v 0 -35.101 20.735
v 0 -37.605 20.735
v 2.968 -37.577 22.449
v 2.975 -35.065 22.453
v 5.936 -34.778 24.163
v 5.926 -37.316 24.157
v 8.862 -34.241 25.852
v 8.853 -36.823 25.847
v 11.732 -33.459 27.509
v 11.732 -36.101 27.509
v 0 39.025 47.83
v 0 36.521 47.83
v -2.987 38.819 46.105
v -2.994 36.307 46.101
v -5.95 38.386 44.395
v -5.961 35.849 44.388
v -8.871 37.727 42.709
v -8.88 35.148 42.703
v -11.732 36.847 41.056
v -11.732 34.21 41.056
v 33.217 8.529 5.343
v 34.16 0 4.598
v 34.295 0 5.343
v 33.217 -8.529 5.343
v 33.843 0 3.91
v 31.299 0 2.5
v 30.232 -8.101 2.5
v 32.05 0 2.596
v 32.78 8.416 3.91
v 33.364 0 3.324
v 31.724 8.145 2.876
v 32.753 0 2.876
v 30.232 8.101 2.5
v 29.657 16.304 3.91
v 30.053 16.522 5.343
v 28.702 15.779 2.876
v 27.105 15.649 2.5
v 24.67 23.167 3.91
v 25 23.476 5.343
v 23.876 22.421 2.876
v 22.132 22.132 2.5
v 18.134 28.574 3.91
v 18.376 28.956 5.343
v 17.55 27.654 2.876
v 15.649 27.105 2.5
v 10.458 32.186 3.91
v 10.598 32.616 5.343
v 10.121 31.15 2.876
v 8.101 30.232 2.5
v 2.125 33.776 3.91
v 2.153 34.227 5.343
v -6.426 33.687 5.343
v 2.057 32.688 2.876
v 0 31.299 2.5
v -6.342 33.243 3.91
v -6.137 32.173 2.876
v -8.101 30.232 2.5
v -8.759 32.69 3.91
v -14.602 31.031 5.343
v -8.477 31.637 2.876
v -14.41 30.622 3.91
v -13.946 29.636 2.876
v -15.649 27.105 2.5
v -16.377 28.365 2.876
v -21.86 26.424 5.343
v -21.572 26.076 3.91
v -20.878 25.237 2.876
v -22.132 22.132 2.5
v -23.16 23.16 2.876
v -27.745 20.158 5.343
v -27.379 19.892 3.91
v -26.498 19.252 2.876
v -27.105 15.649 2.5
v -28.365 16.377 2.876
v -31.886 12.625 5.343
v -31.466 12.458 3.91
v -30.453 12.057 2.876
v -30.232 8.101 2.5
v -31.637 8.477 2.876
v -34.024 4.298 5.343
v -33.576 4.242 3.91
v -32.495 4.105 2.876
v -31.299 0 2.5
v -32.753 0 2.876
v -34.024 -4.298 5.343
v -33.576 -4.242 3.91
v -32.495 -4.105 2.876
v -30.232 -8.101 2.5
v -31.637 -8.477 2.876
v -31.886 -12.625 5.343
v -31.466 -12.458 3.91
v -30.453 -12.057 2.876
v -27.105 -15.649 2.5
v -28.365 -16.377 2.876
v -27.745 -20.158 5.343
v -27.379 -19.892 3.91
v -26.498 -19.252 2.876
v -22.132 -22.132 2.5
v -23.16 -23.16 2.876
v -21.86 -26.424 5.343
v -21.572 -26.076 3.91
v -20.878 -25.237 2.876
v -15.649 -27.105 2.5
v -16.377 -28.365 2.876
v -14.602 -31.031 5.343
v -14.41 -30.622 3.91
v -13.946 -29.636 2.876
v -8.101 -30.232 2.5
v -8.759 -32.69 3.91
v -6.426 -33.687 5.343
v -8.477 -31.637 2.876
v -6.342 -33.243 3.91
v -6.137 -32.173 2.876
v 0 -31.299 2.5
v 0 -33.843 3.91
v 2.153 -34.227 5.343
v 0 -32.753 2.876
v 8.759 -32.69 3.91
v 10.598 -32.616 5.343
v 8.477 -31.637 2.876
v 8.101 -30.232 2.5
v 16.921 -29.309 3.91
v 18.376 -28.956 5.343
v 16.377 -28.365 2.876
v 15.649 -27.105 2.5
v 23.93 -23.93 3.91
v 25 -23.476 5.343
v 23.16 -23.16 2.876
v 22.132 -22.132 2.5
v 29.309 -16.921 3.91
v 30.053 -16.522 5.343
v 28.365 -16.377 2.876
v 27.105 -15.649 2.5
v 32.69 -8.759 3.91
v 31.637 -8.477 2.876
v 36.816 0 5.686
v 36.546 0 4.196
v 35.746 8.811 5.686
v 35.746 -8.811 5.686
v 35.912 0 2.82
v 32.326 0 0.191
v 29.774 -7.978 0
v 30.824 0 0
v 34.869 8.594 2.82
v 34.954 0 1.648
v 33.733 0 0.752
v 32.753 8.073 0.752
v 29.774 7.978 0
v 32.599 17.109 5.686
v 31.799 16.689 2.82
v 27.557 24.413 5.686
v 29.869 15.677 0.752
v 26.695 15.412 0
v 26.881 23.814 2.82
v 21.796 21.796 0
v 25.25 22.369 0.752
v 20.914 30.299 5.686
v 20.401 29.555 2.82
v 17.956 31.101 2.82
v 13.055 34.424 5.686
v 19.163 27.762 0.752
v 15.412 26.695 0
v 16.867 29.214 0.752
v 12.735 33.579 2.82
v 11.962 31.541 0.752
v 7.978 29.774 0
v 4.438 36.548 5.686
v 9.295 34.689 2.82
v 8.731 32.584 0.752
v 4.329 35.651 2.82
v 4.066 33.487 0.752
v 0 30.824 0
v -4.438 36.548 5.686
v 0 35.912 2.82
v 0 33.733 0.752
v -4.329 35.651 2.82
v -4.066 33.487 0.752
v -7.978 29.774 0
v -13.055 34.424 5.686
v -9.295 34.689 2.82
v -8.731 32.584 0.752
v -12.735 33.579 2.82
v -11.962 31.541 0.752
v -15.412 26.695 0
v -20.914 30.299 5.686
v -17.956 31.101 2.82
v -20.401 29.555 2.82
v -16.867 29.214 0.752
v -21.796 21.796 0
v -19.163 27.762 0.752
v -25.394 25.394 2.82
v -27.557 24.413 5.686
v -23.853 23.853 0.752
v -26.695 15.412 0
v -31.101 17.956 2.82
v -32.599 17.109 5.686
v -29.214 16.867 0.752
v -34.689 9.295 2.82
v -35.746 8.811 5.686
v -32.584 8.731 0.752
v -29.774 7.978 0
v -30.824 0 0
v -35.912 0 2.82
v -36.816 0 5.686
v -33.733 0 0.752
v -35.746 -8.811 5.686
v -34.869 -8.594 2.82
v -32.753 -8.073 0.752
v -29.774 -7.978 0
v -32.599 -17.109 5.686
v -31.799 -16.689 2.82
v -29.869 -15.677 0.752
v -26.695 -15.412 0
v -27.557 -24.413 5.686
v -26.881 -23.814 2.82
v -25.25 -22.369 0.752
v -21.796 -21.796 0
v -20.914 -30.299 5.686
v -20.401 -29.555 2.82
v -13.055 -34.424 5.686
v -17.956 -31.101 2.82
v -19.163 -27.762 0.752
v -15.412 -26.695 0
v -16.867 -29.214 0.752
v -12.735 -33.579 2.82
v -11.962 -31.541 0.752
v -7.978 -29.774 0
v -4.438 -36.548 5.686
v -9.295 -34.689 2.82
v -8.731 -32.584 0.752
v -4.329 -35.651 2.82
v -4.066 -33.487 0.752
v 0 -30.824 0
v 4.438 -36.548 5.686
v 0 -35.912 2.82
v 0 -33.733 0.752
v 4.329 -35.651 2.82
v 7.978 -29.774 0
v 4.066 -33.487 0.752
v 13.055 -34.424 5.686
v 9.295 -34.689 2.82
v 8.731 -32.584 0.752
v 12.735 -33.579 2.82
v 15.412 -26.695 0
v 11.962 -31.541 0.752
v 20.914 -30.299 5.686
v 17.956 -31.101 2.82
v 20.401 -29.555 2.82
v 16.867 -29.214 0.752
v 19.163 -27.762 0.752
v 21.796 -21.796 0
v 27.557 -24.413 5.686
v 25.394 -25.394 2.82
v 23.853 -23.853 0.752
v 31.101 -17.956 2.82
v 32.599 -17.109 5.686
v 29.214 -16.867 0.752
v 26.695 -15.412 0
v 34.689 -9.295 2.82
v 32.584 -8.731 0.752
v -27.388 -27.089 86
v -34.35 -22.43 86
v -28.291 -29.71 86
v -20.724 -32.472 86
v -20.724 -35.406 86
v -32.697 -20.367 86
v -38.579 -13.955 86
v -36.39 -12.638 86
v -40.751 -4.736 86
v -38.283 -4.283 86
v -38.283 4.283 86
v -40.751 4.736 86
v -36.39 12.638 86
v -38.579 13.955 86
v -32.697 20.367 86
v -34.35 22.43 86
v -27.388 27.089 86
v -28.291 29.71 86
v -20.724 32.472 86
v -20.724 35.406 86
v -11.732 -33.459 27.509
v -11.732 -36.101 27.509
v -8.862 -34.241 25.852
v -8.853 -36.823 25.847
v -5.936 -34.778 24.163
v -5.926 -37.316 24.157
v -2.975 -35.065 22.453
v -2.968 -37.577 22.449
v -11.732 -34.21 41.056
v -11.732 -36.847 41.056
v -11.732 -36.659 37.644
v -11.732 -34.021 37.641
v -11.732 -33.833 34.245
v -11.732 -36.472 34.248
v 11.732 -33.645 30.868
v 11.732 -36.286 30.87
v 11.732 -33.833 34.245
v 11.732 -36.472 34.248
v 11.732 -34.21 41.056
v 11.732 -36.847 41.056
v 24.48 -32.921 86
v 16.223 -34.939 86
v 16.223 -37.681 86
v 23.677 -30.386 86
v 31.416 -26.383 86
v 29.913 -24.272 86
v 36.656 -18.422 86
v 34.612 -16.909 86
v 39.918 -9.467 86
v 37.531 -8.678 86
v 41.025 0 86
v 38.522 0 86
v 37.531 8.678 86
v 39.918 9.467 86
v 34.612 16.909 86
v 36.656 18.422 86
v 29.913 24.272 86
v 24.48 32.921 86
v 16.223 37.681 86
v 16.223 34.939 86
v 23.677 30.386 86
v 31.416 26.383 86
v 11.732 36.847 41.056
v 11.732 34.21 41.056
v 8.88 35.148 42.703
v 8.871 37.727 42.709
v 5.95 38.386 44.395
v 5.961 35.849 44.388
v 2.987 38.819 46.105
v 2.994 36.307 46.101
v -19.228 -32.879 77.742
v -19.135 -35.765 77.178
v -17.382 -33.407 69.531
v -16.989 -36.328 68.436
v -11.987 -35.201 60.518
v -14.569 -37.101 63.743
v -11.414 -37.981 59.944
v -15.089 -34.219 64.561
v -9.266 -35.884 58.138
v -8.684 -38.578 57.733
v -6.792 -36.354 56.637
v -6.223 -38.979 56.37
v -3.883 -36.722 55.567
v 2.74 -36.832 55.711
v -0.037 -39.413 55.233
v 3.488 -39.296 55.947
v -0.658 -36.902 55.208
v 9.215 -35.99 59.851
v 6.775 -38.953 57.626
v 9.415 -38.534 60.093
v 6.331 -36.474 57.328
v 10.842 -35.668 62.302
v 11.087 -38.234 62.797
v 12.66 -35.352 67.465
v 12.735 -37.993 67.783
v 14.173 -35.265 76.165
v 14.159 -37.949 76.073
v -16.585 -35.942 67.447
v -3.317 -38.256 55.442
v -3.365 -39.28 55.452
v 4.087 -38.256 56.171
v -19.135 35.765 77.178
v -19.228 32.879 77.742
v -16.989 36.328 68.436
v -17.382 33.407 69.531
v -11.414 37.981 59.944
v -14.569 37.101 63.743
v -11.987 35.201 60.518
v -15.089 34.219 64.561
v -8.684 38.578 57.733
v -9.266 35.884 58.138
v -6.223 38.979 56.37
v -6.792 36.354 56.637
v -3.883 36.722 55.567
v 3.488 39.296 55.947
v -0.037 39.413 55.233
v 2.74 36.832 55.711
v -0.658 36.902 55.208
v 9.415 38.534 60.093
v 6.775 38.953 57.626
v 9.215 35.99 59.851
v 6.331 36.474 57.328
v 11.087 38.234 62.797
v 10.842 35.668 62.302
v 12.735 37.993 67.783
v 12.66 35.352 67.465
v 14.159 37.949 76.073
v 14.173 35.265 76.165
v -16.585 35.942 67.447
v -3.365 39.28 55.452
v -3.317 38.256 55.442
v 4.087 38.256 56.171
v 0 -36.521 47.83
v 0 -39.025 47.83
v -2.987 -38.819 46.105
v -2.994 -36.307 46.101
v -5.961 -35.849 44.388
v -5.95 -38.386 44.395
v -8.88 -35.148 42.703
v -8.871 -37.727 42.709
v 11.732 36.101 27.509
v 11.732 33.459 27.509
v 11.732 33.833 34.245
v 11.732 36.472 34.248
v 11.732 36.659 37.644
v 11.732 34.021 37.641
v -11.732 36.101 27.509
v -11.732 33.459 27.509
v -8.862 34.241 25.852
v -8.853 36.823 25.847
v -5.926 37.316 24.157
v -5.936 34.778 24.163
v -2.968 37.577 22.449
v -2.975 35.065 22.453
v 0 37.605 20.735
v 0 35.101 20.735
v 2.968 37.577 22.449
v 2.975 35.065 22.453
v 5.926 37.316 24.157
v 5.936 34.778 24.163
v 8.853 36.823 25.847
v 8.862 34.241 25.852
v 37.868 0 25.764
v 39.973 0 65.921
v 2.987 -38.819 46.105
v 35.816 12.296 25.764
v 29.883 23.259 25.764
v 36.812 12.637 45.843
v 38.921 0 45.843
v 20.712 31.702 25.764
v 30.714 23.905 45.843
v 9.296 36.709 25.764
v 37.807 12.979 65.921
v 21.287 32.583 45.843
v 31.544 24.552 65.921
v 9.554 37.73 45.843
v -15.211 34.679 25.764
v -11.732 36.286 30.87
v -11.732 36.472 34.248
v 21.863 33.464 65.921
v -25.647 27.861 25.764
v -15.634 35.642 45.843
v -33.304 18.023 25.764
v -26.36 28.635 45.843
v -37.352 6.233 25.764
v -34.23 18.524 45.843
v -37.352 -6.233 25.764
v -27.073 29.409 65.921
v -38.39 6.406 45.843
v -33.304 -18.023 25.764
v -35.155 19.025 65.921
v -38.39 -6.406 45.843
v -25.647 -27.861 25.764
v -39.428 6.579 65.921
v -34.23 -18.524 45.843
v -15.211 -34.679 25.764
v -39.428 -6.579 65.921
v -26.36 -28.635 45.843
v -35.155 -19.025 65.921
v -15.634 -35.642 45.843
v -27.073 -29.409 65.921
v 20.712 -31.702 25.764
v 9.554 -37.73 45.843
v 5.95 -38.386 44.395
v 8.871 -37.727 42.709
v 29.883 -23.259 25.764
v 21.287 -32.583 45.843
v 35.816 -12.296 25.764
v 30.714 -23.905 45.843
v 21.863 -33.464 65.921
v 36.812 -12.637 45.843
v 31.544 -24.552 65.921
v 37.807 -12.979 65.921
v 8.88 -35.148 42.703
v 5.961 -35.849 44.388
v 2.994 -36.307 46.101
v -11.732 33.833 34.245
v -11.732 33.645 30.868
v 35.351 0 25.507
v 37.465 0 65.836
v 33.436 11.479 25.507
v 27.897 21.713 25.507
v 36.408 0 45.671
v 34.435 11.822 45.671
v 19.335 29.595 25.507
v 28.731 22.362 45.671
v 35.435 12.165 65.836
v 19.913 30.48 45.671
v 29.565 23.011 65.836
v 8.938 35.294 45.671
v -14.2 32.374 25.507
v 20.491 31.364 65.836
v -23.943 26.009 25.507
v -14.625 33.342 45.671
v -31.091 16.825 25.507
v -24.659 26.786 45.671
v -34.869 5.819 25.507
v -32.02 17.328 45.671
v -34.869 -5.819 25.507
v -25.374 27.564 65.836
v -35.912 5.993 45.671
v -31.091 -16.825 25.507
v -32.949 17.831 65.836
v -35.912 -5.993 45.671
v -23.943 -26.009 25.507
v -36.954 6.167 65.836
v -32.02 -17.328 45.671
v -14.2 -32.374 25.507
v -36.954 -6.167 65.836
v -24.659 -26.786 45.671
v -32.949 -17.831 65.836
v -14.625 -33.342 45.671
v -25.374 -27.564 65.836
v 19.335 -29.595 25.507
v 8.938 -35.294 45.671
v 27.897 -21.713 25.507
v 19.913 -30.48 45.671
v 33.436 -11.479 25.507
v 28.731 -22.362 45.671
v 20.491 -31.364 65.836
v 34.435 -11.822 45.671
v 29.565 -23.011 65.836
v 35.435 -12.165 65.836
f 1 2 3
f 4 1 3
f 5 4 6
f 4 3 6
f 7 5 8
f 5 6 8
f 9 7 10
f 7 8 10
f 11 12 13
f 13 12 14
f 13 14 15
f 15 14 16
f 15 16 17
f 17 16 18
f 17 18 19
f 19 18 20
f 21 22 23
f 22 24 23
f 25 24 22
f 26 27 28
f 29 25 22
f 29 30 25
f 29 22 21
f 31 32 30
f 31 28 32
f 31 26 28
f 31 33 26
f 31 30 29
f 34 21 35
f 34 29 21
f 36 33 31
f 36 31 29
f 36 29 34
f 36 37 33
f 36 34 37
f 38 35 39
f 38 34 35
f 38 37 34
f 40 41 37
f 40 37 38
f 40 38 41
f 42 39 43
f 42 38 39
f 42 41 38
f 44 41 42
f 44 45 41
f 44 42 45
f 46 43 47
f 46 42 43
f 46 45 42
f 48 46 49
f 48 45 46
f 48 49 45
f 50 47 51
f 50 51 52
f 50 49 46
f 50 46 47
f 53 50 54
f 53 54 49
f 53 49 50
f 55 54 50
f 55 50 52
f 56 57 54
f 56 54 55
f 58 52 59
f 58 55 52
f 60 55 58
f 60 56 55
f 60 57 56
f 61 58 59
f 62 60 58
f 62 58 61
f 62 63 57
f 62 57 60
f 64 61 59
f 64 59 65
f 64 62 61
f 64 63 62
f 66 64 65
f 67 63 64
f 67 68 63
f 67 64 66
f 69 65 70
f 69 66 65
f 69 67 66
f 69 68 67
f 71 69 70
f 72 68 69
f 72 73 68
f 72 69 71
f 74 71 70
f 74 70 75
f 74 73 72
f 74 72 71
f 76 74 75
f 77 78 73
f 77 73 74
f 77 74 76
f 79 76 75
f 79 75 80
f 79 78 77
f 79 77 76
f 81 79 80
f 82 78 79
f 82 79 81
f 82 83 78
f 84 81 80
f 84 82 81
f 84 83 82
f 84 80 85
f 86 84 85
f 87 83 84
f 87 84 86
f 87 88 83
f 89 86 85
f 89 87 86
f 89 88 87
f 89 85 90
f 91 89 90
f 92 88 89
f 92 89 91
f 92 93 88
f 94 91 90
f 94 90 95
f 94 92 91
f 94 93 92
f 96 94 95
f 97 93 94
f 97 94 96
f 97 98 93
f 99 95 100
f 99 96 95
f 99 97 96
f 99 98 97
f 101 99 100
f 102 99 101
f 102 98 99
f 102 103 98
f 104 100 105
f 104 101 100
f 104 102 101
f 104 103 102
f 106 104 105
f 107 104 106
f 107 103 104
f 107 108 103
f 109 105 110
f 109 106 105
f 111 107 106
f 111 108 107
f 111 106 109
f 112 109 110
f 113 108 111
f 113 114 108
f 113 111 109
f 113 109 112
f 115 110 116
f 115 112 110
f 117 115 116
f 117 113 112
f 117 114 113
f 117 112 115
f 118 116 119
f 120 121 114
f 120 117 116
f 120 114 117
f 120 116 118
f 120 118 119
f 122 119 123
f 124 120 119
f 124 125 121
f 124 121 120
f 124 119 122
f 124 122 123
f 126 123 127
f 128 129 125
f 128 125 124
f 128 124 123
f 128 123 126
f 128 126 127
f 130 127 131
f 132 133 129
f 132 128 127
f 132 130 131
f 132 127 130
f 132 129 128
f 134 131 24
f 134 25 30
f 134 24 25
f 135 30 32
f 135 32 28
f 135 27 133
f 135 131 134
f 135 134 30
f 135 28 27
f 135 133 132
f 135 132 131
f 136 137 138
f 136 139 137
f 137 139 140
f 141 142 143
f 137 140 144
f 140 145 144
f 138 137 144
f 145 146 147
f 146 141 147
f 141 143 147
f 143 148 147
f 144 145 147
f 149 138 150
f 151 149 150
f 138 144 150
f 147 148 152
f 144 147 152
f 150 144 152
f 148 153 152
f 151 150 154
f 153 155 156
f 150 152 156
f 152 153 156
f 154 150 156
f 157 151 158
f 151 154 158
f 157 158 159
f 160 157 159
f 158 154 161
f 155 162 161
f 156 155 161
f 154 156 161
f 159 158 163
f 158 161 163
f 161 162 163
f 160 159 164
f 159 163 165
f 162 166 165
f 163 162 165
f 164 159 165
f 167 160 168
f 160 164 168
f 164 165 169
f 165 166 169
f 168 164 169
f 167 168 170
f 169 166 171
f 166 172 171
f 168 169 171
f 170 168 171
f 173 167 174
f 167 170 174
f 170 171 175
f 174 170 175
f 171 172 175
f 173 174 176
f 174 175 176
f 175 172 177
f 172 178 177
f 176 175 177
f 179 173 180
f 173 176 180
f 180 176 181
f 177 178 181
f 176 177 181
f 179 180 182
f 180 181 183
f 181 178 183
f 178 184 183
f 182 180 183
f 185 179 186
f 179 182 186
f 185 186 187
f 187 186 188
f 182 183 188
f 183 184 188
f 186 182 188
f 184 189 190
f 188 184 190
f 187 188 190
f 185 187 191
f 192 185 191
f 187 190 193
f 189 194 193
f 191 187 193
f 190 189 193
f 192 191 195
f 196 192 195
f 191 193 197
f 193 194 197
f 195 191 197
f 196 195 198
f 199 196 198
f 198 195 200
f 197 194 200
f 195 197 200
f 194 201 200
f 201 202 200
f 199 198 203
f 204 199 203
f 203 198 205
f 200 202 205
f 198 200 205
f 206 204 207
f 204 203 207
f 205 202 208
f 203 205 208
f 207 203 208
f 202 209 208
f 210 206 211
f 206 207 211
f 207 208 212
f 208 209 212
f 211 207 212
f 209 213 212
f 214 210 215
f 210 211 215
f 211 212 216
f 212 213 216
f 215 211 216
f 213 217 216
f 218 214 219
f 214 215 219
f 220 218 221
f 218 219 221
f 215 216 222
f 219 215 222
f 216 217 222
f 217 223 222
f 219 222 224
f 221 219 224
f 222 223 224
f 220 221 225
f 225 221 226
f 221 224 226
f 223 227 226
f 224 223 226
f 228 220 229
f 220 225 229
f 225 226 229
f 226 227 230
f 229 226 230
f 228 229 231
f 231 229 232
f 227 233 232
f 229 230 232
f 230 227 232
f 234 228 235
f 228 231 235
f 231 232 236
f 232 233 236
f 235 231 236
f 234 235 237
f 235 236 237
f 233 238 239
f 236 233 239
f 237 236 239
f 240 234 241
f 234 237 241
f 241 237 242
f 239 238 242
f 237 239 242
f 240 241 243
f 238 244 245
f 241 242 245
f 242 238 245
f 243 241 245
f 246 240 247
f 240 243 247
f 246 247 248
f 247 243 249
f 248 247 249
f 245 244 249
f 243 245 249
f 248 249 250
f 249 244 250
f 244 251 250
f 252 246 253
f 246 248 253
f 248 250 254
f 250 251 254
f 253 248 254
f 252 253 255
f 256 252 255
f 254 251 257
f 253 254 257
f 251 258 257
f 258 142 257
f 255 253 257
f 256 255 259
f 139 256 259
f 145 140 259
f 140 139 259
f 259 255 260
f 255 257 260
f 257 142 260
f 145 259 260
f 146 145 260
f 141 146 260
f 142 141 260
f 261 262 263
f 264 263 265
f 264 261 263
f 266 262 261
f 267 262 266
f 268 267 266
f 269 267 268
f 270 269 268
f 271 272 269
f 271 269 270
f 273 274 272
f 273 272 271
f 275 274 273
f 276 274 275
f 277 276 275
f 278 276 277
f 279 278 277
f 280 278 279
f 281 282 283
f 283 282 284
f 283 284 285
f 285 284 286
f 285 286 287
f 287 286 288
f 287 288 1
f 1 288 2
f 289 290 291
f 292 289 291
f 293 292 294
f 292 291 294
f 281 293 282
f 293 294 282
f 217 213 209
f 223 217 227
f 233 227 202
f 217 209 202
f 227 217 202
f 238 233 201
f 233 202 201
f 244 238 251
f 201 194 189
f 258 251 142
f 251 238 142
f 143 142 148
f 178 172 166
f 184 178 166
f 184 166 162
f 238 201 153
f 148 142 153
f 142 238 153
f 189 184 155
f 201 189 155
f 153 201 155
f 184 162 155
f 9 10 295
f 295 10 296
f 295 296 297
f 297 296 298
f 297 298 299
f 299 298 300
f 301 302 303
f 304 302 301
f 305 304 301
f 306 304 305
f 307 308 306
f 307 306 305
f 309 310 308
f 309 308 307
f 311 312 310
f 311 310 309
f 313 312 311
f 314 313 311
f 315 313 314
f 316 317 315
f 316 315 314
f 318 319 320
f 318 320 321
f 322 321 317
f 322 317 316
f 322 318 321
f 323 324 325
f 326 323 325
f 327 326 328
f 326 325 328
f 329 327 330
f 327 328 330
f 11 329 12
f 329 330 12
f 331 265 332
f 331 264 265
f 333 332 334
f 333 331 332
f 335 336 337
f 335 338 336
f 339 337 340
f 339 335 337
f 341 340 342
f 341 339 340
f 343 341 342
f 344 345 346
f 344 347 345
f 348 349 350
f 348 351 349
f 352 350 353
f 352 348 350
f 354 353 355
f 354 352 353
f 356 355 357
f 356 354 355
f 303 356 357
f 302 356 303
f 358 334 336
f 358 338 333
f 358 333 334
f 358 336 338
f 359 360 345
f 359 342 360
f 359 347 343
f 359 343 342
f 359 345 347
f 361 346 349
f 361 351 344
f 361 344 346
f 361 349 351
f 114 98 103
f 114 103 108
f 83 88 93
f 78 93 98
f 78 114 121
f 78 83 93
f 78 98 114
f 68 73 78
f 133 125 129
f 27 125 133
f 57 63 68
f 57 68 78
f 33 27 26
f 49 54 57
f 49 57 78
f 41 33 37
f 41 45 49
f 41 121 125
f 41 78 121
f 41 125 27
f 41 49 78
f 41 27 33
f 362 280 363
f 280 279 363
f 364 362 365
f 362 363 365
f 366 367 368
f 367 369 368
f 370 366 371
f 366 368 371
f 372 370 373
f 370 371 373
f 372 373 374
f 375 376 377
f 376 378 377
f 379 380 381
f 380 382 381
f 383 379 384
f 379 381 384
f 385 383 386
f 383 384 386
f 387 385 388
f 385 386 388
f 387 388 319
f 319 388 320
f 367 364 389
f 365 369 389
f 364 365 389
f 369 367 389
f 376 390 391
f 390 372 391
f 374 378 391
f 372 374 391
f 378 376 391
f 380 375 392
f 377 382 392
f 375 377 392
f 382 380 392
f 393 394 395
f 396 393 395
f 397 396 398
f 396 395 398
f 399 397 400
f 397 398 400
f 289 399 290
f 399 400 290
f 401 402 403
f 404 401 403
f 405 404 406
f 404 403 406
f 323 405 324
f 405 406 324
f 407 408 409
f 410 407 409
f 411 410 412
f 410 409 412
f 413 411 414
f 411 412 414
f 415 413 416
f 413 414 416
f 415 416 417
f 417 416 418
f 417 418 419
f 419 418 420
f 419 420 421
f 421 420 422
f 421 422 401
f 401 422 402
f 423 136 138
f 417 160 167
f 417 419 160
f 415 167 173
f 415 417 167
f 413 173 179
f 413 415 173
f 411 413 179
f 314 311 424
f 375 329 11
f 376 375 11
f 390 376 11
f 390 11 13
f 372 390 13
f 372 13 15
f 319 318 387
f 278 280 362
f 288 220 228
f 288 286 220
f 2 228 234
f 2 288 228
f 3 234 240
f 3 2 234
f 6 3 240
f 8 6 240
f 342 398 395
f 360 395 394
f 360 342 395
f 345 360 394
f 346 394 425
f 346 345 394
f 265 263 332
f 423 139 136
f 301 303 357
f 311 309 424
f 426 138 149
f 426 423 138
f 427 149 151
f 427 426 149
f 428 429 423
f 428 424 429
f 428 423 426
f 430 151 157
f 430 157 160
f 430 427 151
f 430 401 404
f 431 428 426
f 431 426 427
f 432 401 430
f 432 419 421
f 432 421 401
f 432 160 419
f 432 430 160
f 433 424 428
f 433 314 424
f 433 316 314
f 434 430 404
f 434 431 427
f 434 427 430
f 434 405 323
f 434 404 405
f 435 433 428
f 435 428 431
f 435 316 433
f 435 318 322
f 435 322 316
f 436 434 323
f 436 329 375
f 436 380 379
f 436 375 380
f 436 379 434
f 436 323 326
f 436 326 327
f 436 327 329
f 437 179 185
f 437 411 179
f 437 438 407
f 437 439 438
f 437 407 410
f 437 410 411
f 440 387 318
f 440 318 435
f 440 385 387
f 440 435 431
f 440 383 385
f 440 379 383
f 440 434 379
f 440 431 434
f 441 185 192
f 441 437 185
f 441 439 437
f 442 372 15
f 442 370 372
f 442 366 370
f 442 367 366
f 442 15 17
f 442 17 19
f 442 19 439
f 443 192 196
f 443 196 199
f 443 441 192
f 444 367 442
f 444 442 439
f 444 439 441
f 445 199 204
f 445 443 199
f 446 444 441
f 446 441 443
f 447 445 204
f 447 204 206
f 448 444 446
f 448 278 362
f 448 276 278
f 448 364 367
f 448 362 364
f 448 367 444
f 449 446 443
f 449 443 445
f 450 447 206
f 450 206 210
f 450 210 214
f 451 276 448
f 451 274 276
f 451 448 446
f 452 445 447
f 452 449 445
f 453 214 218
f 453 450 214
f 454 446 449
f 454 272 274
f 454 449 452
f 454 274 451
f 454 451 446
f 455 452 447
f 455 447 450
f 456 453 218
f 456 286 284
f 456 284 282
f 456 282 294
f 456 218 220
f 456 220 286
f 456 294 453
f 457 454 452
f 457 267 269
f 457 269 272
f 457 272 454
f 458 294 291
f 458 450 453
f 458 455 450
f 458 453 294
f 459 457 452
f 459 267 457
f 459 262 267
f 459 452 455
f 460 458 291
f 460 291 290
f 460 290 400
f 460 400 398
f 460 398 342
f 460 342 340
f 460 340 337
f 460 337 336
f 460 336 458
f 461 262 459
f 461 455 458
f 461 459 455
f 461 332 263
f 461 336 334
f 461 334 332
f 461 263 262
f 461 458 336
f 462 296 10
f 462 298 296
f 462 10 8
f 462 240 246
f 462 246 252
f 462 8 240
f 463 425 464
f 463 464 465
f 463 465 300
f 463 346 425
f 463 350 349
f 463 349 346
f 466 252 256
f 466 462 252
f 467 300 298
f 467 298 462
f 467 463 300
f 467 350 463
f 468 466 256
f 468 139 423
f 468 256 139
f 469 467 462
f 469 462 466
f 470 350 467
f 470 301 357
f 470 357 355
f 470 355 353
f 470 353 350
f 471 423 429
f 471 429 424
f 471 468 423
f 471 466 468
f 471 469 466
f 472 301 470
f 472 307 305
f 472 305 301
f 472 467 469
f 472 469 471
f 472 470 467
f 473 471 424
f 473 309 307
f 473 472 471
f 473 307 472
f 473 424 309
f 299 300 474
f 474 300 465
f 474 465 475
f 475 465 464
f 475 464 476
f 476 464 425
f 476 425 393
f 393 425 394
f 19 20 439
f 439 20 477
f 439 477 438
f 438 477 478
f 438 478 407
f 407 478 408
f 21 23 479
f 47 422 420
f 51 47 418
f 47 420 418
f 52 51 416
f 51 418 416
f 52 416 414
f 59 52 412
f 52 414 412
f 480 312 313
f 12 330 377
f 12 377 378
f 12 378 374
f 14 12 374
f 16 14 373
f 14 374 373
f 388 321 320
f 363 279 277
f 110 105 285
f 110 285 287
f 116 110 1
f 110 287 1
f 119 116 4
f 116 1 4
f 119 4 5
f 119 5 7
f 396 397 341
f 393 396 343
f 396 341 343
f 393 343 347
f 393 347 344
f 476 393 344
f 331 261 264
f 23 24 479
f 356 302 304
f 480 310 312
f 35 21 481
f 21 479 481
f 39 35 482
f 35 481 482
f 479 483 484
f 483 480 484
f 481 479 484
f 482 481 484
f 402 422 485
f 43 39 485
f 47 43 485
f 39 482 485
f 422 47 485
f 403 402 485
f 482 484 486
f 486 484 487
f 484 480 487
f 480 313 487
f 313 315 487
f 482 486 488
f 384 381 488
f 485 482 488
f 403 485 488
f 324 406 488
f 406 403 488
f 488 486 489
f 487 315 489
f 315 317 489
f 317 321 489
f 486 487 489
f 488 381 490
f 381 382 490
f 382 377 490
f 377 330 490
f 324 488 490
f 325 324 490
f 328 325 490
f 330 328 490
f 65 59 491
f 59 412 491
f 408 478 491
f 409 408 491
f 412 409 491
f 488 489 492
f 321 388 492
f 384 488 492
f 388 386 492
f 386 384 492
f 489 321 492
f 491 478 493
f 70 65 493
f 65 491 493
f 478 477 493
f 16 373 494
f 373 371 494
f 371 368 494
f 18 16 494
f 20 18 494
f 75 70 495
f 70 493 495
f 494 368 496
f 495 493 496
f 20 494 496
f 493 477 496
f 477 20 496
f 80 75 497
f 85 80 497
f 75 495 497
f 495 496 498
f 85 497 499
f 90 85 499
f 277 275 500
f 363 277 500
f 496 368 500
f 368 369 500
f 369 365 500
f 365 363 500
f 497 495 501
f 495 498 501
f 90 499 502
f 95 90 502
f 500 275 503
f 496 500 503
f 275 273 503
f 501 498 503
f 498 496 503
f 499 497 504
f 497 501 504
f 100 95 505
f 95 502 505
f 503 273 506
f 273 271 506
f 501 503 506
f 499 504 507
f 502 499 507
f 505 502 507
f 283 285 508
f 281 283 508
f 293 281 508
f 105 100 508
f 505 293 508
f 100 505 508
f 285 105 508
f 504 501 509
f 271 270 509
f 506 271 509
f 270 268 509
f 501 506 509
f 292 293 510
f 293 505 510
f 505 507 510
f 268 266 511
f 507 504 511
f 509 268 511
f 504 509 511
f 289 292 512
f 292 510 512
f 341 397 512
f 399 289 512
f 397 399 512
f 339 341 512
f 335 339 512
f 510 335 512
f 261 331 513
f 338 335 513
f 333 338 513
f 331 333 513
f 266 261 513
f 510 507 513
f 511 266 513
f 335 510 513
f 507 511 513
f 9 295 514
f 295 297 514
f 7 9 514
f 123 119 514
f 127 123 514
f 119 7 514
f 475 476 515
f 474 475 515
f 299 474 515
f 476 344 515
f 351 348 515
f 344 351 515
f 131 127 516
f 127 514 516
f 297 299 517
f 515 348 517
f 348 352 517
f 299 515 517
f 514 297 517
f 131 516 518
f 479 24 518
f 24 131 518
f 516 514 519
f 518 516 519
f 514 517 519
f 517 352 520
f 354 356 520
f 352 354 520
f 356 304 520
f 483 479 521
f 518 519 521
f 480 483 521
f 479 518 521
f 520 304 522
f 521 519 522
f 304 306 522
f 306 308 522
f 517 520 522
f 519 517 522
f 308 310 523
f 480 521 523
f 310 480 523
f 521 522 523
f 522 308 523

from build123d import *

# Parameters (mm, degrees)
F0_R     = 36.5179741317
F1_DEPTH = 86
F1_TAPER = -3
F2_T     = -2.5
F4_DEPTH = 67.6
F6_DEPTH = 101
F7_R     = 3
F8_R     = 6


with BuildPart() as f1:
    # F0 (on Top) → F1 (new body)
    with BuildSketch(Plane.XY):
        Circle(F0_R)
    extrude(amount=F1_DEPTH, taper=F1_TAPER)

    # F2
    f2_openings = [f1.faces().sort_by_distance(p)[0] for p in [
        (0, 0, 86),
    ]]
    offset(amount=F2_T, openings=f2_openings, kind=Kind.INTERSECTION)

    # F3 (on Front) → F4 (cut, symmetric)
    with BuildSketch(Plane.XZ):
        Polygon((11.7323016748, 27.5090516972), (11.7323016748, 41.0563467575), (0, 47.8299942876), (-11.7323016748, 41.0563467575), (-11.7323016748, 27.5090516972), (0, 20.735404167), align=None)
    extrude(amount=F4_DEPTH, both=True, mode=Mode.SUBTRACT)

    # F5 (on Front) → F6 (cut, symmetric)
    with BuildSketch(Plane.XZ):
        with BuildLine():
            Line((29.2842475001, 110.4101017118), (-35.2238230407, 110.4101017118))
            add(Edge.make_bspline(
                [(-35.2238230407, 110.4101017118), (-29.7514190862, 103.6952824897), (-18.9586292348, 90.4497753083), (-19.7072395408, 67.0216235894), (-4.321025151, 52.1067751561), (13.9204202649, 59.2901365819), (13.1893577046, 85.3497190624), (23.5286639854, 102.6772105116), (29.2842475001, 110.4101017118)],
                knots=[0, 0, 0, 0, 0.1785016092, 0.346871767, 0.4974328306, 0.6320967895, 0.8055665743, 1, 1, 1, 1], degree=3))
        make_face()
    extrude(amount=F6_DEPTH, both=True, mode=Mode.SUBTRACT)

    # F7
    f7_edges = [f1.edges().sort_by_distance(p)[0] for p in [
        (-34.145563, 0, 2.5),
    ]]
    fillet(f7_edges, radius=F7_R)

    # F8
    f8_edges = [f1.edges().sort_by_distance(p)[0] for p in [
        (-36.517974, 0, 0),
    ]]
    fillet(f8_edges, radius=F8_R)


solid = f1.part
